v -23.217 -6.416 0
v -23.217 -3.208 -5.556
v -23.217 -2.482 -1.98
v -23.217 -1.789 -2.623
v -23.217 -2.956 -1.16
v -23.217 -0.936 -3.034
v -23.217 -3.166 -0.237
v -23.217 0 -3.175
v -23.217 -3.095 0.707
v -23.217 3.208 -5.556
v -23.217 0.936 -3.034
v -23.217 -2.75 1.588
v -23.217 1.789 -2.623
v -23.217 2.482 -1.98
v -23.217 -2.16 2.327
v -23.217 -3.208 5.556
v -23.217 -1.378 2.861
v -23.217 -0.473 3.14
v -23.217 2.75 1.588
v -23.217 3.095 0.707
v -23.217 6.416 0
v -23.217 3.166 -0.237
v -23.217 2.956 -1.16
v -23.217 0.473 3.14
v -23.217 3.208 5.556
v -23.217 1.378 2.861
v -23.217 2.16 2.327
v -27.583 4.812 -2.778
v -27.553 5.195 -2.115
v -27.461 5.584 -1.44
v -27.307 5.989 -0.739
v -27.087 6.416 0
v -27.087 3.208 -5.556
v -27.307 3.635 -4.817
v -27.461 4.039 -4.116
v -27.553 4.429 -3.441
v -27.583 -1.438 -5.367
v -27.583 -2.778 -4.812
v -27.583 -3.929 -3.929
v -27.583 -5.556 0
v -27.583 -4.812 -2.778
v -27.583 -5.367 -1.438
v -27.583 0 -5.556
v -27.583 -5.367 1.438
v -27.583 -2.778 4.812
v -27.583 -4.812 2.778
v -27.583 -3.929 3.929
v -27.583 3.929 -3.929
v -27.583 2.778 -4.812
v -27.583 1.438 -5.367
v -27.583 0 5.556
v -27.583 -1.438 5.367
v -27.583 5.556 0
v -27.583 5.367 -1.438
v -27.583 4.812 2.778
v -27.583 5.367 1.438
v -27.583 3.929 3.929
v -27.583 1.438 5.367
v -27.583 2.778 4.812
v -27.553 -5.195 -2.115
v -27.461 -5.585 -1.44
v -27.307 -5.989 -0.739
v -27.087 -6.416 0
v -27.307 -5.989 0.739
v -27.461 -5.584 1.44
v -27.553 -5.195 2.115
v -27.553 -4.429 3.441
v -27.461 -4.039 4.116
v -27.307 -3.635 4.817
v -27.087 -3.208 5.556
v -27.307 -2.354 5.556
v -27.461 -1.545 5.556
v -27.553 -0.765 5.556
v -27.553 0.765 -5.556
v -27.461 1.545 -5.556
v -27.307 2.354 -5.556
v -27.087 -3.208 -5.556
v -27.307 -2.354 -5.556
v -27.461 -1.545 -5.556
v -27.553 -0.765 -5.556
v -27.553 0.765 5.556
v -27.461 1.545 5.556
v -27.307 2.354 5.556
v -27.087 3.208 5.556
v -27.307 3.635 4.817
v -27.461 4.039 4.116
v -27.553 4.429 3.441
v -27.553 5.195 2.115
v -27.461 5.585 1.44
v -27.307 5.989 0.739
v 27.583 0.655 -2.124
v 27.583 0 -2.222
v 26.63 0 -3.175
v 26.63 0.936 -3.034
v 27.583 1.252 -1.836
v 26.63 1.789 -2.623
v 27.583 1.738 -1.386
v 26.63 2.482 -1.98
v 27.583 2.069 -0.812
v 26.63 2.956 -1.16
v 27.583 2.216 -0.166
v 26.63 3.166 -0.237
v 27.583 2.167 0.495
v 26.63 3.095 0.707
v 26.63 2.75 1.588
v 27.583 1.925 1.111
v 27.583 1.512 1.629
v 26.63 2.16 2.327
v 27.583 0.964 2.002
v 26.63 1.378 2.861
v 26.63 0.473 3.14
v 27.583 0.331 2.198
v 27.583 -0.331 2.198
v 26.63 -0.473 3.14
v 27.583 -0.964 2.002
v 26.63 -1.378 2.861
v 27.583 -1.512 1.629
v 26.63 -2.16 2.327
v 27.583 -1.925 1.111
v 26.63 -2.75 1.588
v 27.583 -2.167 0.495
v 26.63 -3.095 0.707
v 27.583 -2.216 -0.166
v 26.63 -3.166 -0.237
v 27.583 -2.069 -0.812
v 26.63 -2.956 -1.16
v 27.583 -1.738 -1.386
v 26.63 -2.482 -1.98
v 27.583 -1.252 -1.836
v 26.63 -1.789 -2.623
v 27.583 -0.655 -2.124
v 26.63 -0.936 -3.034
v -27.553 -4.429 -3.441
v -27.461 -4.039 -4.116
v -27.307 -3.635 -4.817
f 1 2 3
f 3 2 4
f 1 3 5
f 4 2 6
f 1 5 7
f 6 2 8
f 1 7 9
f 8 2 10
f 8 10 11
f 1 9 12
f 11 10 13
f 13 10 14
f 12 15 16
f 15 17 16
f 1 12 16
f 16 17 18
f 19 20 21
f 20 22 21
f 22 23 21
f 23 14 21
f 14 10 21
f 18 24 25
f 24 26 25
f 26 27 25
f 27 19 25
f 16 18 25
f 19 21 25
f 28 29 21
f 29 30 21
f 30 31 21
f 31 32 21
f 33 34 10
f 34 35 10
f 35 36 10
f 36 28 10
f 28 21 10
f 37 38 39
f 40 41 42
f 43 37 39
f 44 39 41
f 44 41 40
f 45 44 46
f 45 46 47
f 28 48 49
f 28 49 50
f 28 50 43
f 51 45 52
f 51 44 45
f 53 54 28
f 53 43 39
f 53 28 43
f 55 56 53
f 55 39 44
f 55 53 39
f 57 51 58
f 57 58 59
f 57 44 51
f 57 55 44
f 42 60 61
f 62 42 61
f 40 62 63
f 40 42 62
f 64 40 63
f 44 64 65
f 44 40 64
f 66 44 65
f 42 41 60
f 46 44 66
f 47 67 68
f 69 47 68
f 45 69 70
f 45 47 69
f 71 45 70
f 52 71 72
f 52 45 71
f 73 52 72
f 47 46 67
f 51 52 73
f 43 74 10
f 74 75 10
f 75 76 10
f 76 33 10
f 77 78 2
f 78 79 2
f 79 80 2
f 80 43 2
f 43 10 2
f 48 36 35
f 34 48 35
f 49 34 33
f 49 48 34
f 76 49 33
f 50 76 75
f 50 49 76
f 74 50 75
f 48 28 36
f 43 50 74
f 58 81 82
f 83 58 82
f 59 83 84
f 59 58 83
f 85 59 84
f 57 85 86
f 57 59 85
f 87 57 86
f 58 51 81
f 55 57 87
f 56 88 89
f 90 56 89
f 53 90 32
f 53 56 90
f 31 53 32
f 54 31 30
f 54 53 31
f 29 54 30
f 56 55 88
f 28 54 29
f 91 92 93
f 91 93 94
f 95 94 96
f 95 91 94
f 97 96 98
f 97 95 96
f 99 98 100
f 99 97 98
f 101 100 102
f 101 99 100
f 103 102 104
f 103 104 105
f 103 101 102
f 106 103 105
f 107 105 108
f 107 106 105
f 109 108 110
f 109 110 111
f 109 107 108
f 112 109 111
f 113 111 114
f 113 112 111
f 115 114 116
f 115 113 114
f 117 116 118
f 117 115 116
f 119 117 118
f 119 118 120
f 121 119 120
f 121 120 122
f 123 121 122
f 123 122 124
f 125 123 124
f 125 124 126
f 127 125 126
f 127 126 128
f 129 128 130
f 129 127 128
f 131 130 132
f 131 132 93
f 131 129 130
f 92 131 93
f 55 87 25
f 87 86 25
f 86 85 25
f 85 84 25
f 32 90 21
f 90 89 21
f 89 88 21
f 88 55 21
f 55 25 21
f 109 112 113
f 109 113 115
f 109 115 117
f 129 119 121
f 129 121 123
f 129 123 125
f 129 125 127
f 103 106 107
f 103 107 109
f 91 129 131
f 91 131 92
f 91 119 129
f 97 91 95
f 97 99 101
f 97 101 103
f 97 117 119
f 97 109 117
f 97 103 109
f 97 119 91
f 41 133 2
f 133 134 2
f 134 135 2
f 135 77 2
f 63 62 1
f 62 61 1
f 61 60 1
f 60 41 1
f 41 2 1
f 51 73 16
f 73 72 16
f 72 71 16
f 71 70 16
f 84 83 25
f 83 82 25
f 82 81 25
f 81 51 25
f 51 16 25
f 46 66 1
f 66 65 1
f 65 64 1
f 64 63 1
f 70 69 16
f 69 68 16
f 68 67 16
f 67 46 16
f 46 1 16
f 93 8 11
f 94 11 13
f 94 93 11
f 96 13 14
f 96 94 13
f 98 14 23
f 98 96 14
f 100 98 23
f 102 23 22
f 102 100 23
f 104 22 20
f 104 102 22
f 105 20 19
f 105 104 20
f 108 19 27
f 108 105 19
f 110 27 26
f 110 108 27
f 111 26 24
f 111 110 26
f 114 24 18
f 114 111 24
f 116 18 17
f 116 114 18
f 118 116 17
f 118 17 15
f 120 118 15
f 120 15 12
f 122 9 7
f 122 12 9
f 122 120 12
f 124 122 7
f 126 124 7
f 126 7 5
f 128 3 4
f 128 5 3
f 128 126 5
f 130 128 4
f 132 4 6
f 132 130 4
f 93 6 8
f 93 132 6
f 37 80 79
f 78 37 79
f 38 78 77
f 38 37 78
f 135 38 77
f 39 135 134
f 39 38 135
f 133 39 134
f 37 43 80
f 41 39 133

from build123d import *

# Parameters (mm, degrees)
SKETCH5_R           = 3.175
BOSS_EXTRUDE3_DEPTH = 50.8
CHAMFER1_SIZE       = 0.9525
BOSS_EXTRUDE4_DEPTH = 4.365625
SKETCH8_OUTSIDE_W   = 221.468
SKETCH8_OUTSIDE_H   = 223.188
SKETCH8_OUTSIDE_R   = 5.55625
CUT_EXTRUDE3_DEPTH  = 56.814699209
CUT_EXTRUDE3_DRAFT  = -60


with BuildPart() as part:
    # Sketch5 → Boss-Extrude3 (new body)
    with BuildSketch(Plane(origin=(27.5828125, 0, 0), x_dir=(0, 0, -1), z_dir=(1, 0, 0))):
        Circle(SKETCH5_R)
    extrude(amount=-BOSS_EXTRUDE3_DEPTH)

    # Chamfer1
    chamfer1_edges = [part.edges().sort_by_distance(p)[0] for p in [
        (27.5828125, 0, 3.175),
    ]]
    chamfer(chamfer1_edges, length=CHAMFER1_SIZE)

    # Sketch11 → Revolve1 (revolve)
    with BuildSketch(Plane.XY):
        Polygon((-23.2171875, 3.175), (-23.2171875, 0), (11.7078125, 0), (8.5328125, 3.175), align=None)
    revolve(axis=Axis((-23.2171875, 0, 0), (1, 0, 0)))

    # Sketch6 → Boss-Extrude4 (add)
    with BuildSketch(Plane.ZY.offset(23.2171875)):
        Polygon((5.55625, 3.207902433), (0, 6.415804866), (-5.55625, 3.207902433), (-5.55625, -3.207902433), (0, -6.415804866), (5.55625, -3.207902433), align=None)
    extrude(amount=BOSS_EXTRUDE4_DEPTH)


with BuildPart() as cut_extrude3_tool:
    # Sketch8 outside → Cut-Extrude3 (with draft: the straight prism first)
    with BuildSketch(Plane.ZY.offset(27.5828125)):
        Rectangle(SKETCH8_OUTSIDE_W, SKETCH8_OUTSIDE_H)
        Circle(SKETCH8_OUTSIDE_R, mode=Mode.SUBTRACT)
    extrude(amount=-CUT_EXTRUDE3_DEPTH)
    # Cut-Extrude3: the draft: its side faces are tilted about the plane it starts from
    cut_extrude3_sides = [cut_extrude3_tool.faces().sort_by_distance(p)[0] for p in [
        (0.824537104, -111.594, 0),
        (0.824537104, 0, 110.734),
        (0.824537104, 111.594, 0),
        (0.824537104, 0, -110.734),
        (0.824537104, 0, -5.55625),
    ]]
    draft(cut_extrude3_sides, Plane.ZY.offset(27.5828125), CUT_EXTRUDE3_DRAFT)


with BuildPart() as part_1:
    add(part.part)

    # Cut-Extrude3: cut by cut_extrude3_tool
    add(cut_extrude3_tool.part, mode=Mode.SUBTRACT)


solid = part_1.part
